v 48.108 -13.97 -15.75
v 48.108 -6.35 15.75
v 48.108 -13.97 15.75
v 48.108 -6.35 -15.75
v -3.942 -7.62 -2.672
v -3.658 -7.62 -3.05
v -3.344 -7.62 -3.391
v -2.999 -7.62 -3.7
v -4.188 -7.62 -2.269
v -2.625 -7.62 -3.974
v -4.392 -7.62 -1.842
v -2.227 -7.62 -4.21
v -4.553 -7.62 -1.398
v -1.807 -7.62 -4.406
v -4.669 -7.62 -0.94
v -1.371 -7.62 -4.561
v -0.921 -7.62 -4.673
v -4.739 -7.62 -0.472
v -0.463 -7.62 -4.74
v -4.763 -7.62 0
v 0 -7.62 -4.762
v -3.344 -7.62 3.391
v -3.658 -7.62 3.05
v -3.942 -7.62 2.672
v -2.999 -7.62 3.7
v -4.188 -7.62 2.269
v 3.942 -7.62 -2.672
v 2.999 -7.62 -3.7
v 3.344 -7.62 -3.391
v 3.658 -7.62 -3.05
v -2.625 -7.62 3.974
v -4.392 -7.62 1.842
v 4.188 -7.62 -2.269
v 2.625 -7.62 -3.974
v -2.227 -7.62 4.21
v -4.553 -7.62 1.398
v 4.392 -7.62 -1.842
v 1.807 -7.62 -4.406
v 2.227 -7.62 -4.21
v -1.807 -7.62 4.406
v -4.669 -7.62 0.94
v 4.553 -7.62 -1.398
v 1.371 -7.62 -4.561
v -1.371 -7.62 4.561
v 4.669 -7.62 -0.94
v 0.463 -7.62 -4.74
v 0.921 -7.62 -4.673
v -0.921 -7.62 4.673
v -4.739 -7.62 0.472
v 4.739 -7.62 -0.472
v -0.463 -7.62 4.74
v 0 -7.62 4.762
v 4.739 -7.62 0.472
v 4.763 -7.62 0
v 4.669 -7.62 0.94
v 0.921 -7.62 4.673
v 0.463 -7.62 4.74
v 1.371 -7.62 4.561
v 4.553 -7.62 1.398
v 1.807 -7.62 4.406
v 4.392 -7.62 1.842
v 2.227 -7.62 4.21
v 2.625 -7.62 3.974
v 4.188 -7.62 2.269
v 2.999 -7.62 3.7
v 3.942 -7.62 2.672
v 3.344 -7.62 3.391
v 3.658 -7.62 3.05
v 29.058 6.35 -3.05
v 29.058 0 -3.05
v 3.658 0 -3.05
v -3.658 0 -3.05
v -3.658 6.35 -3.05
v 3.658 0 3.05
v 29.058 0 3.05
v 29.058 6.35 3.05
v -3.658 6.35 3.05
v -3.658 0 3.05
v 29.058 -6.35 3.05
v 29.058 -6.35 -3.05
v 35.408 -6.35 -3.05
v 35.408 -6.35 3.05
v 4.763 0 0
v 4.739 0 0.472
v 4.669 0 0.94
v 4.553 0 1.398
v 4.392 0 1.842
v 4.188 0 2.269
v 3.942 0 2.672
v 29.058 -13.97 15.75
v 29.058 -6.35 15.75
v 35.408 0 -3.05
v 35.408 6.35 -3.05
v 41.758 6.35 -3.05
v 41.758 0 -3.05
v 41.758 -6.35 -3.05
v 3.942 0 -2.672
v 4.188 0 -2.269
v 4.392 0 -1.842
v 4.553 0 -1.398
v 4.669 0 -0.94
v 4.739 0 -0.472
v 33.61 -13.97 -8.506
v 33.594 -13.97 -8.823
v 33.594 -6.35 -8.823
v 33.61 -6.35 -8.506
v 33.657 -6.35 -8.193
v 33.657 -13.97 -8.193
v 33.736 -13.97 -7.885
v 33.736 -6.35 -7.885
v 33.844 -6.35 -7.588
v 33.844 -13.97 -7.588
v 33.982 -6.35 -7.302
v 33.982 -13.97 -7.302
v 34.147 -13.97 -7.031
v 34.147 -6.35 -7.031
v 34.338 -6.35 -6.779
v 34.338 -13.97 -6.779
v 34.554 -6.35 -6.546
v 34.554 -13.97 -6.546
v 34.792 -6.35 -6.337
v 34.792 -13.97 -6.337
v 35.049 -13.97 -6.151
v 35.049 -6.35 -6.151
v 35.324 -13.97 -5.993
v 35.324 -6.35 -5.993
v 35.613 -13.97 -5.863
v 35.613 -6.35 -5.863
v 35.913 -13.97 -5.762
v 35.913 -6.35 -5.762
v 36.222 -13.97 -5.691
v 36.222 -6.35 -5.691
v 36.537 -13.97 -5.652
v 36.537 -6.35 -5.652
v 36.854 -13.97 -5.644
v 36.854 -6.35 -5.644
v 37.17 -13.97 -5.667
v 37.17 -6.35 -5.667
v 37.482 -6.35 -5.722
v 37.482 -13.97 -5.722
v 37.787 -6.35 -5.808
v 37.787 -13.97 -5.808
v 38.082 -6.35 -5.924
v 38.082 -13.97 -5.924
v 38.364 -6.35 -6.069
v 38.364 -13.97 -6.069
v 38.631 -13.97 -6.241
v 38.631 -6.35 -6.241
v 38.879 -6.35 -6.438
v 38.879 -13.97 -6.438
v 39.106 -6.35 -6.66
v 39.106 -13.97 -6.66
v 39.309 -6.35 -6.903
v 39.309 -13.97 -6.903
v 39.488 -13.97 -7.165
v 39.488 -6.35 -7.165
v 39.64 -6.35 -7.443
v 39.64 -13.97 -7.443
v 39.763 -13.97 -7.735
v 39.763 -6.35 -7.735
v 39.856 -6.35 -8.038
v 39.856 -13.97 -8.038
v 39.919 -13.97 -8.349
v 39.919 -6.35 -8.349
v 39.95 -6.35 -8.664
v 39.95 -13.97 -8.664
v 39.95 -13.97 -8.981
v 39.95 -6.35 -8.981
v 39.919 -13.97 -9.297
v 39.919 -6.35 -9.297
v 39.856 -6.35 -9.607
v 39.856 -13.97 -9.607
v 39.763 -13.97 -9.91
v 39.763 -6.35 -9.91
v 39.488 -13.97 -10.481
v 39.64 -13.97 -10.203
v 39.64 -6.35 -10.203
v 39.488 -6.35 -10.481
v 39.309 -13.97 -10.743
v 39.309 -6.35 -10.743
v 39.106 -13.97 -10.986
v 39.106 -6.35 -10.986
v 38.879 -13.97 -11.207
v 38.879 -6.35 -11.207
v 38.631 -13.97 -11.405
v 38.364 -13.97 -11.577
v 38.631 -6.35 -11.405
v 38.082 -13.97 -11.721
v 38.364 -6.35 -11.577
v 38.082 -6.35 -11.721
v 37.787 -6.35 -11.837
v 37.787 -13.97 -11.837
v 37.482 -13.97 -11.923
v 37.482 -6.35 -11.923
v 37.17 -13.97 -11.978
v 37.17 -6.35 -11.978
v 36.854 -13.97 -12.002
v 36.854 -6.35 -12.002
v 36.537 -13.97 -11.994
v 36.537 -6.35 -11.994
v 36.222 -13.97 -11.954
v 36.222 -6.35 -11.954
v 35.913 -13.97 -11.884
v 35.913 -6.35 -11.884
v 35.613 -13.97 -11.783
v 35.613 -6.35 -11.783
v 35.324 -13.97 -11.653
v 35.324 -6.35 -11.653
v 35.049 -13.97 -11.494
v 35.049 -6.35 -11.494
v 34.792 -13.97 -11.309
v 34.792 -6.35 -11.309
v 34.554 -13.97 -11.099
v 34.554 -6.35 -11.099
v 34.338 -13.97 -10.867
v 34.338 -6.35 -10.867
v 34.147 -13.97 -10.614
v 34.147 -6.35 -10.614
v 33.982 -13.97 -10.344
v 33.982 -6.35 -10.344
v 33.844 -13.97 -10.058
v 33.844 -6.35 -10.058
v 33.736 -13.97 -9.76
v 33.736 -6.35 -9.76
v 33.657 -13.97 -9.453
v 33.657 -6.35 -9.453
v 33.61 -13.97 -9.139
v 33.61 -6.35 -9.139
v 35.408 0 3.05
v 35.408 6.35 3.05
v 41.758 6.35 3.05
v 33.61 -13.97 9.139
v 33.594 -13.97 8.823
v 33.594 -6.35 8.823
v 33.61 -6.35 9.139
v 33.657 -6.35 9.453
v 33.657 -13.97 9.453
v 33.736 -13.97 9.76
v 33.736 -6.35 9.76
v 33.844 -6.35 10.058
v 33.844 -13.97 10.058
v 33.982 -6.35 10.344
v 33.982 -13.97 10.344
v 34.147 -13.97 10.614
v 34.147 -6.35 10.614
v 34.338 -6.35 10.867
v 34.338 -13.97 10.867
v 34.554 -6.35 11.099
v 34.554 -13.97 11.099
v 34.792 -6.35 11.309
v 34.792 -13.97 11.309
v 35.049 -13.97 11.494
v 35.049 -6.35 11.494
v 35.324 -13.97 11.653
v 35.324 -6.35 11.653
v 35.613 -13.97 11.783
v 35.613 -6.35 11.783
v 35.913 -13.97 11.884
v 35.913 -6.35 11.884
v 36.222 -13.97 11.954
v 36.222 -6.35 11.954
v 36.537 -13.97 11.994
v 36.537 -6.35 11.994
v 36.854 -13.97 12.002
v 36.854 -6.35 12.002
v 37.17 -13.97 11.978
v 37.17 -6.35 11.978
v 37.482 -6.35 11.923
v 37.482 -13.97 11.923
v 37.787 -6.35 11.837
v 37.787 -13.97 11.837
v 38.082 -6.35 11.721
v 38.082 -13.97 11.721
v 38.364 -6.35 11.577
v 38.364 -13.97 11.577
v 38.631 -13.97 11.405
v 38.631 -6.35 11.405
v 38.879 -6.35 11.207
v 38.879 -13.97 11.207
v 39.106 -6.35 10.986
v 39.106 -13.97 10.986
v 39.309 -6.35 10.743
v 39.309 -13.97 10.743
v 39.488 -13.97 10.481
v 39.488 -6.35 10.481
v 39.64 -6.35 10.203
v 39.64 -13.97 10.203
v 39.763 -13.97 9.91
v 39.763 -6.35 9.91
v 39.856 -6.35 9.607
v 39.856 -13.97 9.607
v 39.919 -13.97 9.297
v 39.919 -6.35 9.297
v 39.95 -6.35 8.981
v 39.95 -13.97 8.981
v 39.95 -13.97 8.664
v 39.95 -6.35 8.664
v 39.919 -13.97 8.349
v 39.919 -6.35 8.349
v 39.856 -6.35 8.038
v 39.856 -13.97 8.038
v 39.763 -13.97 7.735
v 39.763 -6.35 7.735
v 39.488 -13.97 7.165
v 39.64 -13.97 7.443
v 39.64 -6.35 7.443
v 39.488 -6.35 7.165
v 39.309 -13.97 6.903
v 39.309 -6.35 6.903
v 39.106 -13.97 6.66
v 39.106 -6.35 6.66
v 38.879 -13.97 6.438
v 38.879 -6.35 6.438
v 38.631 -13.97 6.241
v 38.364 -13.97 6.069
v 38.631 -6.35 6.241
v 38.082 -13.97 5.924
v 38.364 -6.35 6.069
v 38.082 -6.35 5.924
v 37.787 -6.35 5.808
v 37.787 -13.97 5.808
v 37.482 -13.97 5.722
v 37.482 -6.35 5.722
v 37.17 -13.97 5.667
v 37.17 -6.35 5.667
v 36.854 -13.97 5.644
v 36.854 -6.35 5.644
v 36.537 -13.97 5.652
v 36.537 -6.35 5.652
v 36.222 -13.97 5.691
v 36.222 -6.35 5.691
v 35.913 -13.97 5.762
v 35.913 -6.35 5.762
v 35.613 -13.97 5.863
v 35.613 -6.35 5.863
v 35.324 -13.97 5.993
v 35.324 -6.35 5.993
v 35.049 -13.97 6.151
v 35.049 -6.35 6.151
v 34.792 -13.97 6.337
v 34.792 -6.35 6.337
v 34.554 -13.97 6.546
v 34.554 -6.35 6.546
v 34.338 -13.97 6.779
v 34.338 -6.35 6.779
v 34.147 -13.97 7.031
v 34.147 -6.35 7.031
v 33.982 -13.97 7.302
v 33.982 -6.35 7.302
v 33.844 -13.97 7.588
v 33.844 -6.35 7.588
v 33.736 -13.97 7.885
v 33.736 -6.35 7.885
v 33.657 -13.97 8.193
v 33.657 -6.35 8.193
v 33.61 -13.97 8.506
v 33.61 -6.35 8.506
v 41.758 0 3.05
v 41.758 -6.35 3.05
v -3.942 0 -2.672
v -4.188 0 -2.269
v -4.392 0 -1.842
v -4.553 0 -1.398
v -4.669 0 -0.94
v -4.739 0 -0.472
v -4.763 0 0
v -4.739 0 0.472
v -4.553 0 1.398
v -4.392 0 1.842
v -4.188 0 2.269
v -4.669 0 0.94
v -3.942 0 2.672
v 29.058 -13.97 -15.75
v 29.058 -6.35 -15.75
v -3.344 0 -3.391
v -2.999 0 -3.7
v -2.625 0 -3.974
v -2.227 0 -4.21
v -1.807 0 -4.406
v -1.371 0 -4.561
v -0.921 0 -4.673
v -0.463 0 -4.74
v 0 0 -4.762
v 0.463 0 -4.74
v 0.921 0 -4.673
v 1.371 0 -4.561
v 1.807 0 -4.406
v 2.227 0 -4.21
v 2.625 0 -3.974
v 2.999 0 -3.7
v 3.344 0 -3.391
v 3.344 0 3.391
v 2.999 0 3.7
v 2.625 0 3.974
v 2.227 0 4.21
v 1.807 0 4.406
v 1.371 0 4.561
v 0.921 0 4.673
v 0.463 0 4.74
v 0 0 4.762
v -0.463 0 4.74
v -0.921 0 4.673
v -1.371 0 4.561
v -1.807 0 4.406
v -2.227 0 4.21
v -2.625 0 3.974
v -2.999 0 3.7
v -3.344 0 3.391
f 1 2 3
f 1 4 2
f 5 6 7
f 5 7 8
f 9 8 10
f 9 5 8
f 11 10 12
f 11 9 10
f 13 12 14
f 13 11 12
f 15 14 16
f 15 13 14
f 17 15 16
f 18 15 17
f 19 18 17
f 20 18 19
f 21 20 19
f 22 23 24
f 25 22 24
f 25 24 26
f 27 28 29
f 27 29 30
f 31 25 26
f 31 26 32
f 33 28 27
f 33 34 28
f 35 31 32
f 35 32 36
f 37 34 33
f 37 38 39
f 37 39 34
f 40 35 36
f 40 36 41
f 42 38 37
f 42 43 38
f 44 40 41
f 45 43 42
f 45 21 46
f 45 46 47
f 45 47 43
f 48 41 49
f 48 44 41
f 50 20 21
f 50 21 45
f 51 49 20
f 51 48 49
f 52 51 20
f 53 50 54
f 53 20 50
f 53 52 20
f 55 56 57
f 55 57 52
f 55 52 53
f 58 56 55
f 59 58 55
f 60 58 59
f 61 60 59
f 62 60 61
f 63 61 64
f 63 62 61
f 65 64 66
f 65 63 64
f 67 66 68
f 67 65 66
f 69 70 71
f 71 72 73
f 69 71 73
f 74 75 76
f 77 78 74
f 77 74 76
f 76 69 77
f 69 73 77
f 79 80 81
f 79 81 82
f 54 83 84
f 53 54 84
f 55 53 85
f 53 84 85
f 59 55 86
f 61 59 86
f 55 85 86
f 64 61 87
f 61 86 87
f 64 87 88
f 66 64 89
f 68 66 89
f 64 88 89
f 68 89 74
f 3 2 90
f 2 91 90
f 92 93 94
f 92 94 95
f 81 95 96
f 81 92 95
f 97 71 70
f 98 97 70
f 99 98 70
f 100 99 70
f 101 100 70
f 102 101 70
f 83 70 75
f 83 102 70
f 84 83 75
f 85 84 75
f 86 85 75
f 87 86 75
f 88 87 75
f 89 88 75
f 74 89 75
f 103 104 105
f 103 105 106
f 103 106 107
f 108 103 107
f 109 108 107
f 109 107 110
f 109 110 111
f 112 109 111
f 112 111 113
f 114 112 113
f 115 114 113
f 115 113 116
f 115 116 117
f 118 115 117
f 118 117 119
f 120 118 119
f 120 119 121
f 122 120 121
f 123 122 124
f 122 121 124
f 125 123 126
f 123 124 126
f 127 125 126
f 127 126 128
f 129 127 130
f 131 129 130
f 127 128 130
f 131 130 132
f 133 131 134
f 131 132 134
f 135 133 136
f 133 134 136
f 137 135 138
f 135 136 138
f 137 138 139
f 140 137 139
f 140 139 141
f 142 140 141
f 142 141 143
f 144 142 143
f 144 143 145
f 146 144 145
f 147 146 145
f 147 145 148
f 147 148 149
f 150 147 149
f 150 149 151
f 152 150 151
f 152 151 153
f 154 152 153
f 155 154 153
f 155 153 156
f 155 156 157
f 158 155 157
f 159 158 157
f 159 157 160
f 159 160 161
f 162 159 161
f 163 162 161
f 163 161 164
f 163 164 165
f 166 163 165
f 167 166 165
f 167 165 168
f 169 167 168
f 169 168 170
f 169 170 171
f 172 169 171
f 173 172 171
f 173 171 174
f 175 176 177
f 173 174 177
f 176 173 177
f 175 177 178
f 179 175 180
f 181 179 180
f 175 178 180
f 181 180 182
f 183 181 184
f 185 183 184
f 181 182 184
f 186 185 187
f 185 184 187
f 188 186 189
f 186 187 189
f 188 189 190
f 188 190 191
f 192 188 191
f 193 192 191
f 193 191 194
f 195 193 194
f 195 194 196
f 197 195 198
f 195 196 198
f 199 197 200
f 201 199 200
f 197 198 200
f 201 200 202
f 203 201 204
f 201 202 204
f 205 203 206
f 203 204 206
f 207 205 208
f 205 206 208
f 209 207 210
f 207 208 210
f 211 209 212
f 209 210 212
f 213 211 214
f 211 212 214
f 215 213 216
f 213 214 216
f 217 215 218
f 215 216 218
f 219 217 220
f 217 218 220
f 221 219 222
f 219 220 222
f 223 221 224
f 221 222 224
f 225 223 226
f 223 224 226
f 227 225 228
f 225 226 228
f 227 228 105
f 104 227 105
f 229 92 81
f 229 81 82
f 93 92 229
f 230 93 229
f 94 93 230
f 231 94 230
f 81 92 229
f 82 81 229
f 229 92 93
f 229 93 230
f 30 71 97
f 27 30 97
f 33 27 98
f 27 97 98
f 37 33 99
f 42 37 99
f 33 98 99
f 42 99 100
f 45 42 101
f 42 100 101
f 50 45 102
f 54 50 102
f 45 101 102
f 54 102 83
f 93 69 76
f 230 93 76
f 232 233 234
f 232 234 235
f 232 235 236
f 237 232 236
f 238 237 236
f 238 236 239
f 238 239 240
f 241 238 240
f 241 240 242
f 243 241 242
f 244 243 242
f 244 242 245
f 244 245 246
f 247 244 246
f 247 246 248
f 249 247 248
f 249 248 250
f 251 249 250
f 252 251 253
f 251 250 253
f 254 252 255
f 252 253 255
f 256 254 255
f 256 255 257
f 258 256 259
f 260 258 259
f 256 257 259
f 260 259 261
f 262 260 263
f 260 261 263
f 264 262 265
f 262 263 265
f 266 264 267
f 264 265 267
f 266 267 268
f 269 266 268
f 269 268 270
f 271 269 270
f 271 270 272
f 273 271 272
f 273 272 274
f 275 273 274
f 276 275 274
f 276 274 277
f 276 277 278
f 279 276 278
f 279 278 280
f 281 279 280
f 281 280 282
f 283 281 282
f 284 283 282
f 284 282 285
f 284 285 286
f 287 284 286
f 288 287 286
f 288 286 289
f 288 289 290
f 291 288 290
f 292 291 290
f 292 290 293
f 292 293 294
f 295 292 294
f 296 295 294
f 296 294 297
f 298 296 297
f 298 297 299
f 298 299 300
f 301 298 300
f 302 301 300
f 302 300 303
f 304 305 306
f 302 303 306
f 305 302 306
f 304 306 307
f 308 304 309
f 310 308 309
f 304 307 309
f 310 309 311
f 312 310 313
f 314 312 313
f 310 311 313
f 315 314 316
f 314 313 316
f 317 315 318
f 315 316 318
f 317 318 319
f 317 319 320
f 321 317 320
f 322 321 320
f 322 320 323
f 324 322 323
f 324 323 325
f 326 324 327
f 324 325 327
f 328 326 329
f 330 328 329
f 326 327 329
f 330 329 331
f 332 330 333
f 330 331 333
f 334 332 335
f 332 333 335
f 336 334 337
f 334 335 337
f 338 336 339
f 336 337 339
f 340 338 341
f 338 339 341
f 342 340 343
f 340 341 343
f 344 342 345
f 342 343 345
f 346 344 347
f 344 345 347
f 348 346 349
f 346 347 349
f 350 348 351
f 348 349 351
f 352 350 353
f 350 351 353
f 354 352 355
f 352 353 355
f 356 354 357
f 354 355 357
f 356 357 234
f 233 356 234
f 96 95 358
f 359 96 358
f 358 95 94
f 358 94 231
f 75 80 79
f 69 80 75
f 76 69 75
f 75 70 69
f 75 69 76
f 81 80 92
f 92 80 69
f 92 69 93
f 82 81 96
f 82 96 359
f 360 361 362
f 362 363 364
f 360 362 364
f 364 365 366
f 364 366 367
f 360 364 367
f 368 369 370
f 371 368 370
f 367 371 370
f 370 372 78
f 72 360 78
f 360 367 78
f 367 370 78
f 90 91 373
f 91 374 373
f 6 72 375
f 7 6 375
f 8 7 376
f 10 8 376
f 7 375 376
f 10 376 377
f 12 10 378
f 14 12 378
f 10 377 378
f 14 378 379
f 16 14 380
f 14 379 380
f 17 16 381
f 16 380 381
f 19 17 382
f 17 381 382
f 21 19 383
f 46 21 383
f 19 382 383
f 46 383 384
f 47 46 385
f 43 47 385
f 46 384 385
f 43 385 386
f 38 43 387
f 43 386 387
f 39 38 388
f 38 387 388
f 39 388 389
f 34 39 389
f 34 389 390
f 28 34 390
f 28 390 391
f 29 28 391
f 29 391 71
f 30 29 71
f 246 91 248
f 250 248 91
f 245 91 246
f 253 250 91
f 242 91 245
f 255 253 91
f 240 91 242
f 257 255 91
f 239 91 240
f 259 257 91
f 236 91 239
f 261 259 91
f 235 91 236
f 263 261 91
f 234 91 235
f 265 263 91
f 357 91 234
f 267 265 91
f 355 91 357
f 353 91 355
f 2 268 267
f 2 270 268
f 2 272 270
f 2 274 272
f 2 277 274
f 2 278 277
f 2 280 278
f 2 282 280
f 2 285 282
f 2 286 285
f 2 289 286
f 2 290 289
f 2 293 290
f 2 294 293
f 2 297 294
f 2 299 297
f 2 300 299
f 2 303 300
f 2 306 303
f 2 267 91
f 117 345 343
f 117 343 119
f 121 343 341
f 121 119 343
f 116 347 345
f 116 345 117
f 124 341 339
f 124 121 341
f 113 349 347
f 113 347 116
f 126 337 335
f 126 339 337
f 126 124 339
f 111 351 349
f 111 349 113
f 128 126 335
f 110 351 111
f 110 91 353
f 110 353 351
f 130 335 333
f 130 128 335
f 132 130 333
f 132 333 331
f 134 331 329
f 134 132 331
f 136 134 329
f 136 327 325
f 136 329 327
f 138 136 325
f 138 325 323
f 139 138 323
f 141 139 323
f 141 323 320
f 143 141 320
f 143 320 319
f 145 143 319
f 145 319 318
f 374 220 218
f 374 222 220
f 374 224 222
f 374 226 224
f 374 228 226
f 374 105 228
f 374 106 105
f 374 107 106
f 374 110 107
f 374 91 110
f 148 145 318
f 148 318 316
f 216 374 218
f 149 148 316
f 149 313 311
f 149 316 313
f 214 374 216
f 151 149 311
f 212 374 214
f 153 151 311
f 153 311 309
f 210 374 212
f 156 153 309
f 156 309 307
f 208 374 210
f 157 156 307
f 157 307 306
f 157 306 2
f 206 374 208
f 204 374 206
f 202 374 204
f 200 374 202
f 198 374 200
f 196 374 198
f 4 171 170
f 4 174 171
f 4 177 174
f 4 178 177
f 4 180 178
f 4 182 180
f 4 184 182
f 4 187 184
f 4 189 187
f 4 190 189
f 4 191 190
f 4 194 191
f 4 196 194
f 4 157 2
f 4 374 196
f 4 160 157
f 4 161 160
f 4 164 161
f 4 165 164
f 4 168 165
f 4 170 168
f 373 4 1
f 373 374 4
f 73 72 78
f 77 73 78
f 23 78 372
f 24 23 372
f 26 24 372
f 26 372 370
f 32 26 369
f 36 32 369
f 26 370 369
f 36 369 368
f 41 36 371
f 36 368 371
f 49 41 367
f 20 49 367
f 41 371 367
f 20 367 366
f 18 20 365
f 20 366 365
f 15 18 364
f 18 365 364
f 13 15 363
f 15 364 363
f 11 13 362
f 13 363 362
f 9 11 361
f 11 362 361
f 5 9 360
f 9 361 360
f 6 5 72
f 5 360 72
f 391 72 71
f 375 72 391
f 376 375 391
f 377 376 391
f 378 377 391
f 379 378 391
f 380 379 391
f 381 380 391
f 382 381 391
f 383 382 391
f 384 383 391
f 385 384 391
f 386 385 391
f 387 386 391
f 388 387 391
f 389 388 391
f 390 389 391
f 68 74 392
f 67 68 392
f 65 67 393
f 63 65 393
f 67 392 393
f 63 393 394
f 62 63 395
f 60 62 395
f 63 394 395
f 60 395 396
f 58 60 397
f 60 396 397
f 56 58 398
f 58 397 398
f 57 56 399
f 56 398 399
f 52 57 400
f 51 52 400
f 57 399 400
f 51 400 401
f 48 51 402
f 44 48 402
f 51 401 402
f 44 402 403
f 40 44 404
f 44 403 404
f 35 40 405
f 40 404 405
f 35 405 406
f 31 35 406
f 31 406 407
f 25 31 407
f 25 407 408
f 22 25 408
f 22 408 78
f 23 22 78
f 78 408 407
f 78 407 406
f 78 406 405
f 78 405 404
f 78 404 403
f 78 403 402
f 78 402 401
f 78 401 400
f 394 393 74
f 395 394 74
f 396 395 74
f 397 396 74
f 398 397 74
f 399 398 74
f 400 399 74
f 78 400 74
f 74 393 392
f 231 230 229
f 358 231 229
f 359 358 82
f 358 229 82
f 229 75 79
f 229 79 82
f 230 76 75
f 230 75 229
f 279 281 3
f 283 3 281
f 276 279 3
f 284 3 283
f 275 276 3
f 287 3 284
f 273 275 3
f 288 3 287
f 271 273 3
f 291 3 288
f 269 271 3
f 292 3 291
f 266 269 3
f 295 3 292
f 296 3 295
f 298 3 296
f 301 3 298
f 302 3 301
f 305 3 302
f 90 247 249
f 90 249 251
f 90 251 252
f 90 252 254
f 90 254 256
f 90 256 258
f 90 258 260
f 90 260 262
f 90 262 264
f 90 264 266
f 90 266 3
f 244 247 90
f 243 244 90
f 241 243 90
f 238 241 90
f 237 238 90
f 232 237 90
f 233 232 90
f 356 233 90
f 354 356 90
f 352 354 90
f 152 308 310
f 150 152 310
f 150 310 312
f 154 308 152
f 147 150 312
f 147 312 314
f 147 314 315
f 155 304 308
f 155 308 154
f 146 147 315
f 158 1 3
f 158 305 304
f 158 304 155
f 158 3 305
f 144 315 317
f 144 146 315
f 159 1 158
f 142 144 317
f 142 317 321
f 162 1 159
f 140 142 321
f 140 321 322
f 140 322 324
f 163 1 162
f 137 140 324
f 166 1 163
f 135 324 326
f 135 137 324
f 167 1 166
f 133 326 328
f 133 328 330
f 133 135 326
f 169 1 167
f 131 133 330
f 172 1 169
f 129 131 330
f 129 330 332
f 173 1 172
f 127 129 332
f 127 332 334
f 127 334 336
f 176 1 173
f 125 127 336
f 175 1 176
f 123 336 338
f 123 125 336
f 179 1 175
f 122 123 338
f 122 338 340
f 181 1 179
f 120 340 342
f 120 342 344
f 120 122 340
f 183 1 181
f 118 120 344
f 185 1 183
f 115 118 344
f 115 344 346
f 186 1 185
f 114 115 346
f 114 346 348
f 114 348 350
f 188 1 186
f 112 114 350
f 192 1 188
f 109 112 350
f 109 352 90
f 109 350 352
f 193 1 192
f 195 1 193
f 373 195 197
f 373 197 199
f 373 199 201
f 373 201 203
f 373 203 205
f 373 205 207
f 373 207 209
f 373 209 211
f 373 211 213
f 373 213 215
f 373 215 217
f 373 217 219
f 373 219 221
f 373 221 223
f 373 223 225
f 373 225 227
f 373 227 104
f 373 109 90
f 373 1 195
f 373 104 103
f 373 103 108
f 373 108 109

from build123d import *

# Parameters (mm, degrees)
F0_W      = 7.3153038846
F0_H      = 6.1001601681
F1_DEPTH  = 7.62
F2_DEPTH  = 6.35
F3_DEPTH  = 25.4
F4_DEPTH  = 6.35
F5_DEPTH  = 6.35
F6_DEPTH  = 7.62
F7_DEPTH  = 12.7
F8_DEPTH  = 12.7
F9_DEPTH  = 12.7
F10_DEPTH = 6.35
F11_R     = 3.1800137538
F12_DEPTH = 25.4


with BuildPart() as f1:
    # F0 (on Front) → F1 (new body)
    with BuildSketch(Plane.XZ):
        with BuildLine():
            ThreePointArc((3.6576519423, -3.0500800841), (4.4777769945, -1.622010924), (4.7625, 0))
            ThreePointArc((4.7625, 0), (4.4777769945, 1.622010924), (3.6576519423, 3.0500800841))
            Line((3.6576519423, 3.0500800841), (3.6576519423, -3.0500800841))
        make_face()
        with BuildLine():
            Line((-3.6576519423, 3.0500800841), (3.6576519423, 3.0500800841))
            ThreePointArc((3.6576519423, 3.0500800841), (0, 4.7625), (-3.6576519423, 3.0500800841))
        make_face()
        Rectangle(F0_W, F0_H)
        with BuildLine():
            ThreePointArc((-3.6576519423, -3.0500800841), (0, -4.7625), (3.6576519423, -3.0500800841))
            Line((3.6576519423, -3.0500800841), (-3.6576519423, -3.0500800841))
        make_face()
        with BuildLine():
            Line((-3.6576519423, -3.0500800841), (-3.6576519423, 3.0500800841))
            ThreePointArc((-3.6576519423, 3.0500800841), (-4.7625, 0), (-3.6576519423, -3.0500800841))
        make_face()
    extrude(amount=F1_DEPTH)

    # F0 (on Front) → F2 (join)
    with BuildSketch(Plane.XZ):
        Rectangle(F0_W, F0_H)
    extrude(amount=-F2_DEPTH)

    # F3 (add): a face of the model
    f3_faces = [f1.faces().sort_by_distance(p)[0] for p in [
        (3.6576519423, 3.175, 0),
    ]]
    extrude(f3_faces, amount=F3_DEPTH)


with BuildPart() as f4:
    # F4 (new): a face of the model
    f4_faces = [f1.part.faces().sort_by_distance(p)[0] for p in [
        (29.0576519423, 3.175, 0),
    ]]
    extrude(f4_faces, amount=F4_DEPTH)

    # F5 (add): a face of the model
    f5_faces = [f4.faces().sort_by_distance(p)[0] for p in [
        (32.2326519423, 0, 0),
    ]]
    extrude(f5_faces, amount=F5_DEPTH)


with BuildPart() as f6:
    # F6 (new): a face of the model
    f6_faces = [f4.part.faces().sort_by_distance(p)[0] for p in [
        (32.2326519423, -6.35, 0),
    ]]
    extrude(f6_faces, amount=F6_DEPTH)

    # F7 (add): a face of the model
    f7_faces = [f6.faces().sort_by_distance(p)[0] for p in [
        (35.4076519423, -10.16, 0),
    ]]
    extrude(f7_faces, amount=F7_DEPTH)

    # F8 (add): a face of the model
    f8_faces = [f6.faces().sort_by_distance(p)[0] for p in [
        (38.5826519423, -10.16, -3.0500800841),
    ]]
    extrude(f8_faces, amount=F8_DEPTH)

    # F9 (add): a face of the model
    f9_faces = [f6.faces().sort_by_distance(p)[0] for p in [
        (38.5826519423, -10.16, 3.0500800841),
    ]]
    extrude(f9_faces, amount=F9_DEPTH)

    # F11 (on face) → F12 (cut)
    with BuildSketch(Plane(origin=(0, -6.35, 0), x_dir=(-1, 0, 0), z_dir=(0, 1, 0))):
        with Locations((-36.7744378746, 8.8227791712)):
            Circle(F11_R)
        with Locations((-36.7744378746, -8.8227791712)):
            Circle(F11_R)
    extrude(amount=-F12_DEPTH, mode=Mode.SUBTRACT)


with BuildPart() as f10:
    # F10 (new): a face of the model
    f10_faces = [f4.part.faces().sort_by_distance(p)[0] for p in [
        (35.4076519423, 0, 0),
    ]]
    extrude(f10_faces, amount=F10_DEPTH)


solid = Compound([f1.part, f4.part, f6.part, f10.part])
